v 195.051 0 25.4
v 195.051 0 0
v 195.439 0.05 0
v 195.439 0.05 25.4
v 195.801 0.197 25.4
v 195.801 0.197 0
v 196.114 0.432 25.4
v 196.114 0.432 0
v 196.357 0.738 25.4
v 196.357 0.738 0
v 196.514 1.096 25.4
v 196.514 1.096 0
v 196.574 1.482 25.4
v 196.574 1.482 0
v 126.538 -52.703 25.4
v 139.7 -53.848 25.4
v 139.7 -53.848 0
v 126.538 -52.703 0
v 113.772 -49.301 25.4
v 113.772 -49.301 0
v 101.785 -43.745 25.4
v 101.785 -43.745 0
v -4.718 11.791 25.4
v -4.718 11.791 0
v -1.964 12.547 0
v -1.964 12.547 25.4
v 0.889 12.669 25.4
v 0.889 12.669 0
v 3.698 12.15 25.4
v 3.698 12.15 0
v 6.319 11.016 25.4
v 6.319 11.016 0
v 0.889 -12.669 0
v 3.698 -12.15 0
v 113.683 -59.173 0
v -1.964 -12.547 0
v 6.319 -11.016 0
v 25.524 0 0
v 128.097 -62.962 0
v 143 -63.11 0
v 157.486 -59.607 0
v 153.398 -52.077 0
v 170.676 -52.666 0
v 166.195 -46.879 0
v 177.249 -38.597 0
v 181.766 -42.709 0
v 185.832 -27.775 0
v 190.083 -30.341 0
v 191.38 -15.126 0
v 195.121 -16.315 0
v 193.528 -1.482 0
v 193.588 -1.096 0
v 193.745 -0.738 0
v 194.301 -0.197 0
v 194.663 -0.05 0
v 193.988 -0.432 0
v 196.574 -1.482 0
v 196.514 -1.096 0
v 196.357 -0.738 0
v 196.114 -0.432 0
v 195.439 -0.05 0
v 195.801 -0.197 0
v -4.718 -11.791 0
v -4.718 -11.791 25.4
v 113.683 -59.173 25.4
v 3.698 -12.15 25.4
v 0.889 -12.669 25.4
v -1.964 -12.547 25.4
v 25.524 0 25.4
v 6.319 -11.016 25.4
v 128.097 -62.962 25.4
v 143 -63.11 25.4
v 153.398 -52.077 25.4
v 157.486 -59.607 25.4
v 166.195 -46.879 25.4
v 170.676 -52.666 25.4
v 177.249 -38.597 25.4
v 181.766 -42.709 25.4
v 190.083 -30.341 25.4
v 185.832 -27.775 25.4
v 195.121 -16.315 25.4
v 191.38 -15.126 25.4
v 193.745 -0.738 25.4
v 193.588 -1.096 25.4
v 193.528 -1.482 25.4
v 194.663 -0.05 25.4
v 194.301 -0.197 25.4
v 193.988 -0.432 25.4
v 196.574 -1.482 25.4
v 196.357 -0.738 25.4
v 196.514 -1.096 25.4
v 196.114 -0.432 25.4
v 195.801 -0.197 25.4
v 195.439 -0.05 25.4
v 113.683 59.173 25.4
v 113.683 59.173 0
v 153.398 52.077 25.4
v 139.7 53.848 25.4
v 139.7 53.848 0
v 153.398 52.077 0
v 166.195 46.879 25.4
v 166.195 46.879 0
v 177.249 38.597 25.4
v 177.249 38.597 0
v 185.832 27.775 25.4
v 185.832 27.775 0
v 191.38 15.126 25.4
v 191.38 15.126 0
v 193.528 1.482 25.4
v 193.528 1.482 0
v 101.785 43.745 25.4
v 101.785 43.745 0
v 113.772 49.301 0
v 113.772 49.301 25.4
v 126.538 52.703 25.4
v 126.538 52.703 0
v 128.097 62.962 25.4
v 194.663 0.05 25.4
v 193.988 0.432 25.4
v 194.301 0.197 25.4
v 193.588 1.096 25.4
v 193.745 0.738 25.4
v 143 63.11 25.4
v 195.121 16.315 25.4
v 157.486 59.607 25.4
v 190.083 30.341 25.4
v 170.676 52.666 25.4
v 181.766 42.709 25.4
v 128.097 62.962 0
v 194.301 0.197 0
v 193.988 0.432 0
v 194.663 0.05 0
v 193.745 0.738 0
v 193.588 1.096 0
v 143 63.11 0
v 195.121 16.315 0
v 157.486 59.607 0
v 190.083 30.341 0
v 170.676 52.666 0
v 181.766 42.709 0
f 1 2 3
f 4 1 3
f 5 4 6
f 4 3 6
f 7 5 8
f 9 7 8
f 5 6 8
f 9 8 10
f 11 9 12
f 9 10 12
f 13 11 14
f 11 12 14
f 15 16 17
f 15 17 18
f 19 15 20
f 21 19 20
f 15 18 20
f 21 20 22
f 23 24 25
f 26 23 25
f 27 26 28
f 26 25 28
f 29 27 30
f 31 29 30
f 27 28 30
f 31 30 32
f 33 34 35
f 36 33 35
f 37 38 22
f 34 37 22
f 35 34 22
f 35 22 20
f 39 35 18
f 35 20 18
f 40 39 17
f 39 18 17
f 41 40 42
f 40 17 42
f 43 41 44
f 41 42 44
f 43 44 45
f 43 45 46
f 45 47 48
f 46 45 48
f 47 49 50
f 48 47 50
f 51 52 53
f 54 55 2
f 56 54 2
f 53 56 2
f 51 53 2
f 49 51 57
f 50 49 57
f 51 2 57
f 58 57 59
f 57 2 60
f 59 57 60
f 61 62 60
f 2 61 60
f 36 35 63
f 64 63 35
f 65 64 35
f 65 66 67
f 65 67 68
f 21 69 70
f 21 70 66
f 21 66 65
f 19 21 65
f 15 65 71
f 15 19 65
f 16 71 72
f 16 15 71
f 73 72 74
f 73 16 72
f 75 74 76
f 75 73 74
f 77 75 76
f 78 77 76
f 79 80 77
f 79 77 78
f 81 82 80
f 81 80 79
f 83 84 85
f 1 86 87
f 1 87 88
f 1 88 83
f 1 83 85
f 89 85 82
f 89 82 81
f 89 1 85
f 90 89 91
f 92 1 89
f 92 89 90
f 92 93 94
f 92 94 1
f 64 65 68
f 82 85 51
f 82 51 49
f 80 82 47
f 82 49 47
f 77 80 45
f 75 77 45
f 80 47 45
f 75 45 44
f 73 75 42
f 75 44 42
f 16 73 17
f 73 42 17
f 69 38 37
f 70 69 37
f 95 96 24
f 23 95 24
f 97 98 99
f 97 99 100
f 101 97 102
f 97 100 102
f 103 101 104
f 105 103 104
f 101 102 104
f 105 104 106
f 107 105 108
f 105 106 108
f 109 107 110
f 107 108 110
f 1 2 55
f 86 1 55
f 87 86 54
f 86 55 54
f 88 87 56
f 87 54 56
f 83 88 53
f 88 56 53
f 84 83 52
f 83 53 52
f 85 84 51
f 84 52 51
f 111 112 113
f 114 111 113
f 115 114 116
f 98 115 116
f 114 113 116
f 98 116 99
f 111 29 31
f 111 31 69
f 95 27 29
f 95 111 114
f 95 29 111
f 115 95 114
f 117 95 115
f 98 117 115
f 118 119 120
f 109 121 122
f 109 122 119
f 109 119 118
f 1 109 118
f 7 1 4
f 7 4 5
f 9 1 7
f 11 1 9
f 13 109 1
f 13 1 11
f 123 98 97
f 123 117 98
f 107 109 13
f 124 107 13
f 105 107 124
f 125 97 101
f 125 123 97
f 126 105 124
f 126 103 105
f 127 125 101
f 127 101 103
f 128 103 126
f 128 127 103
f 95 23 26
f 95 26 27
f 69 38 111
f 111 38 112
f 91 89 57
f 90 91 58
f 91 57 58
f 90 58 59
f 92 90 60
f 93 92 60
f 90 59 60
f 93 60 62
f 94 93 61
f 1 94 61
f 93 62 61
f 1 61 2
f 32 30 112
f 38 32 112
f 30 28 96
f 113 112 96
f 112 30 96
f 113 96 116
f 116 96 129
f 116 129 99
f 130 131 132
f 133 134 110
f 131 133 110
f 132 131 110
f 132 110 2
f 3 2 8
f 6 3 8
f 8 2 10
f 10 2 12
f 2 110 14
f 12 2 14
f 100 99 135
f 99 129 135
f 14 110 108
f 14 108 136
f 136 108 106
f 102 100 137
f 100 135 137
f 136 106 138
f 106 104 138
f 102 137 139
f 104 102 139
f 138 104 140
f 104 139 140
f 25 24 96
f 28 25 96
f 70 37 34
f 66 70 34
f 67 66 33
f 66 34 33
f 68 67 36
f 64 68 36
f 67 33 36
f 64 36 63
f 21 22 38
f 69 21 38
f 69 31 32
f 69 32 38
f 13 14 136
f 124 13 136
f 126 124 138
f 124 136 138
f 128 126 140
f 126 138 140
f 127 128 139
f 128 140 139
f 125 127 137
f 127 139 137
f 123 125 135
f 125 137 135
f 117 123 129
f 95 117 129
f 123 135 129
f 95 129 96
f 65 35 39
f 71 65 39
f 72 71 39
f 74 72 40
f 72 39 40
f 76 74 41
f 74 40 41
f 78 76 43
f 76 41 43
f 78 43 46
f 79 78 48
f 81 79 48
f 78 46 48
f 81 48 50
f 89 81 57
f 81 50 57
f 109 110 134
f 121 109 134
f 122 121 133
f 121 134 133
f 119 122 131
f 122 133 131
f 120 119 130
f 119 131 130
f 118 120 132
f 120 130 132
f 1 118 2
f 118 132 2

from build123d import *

# Parameters (mm, degrees)
F1_DEPTH = 25.4


with BuildPart() as f1:
    # F0 (on Top) → F1 (new body)
    with BuildSketch(Plane.XY):
        with BuildLine():
            ThreePointArc((-4.718497, 11.790919), (0.889164, 12.668835), (6.31922, 11.016236))
            Line((6.31922, 11.016236), (25.523718, 0))
            Line((25.523718, 0), (101.784677, 43.745415))
            ThreePointArc((101.784677, 43.745415), (120.080915, 51.27905), (139.7, 53.848))
            ThreePointArc((139.7, 53.848), (177.248644, 38.596715), (193.527601, 1.482055))
            ThreePointArc((193.527601, 1.482055), (193.988326, 0.43164), (195.051024, 0))
            ThreePointArc((195.051024, 0), (196.113721, 0.43164), (196.574446, 1.482055))
            ThreePointArc((196.574446, 1.482055), (170.675567, 52.665815), (113.682684, 59.172777))
            Line((113.682684, 59.172777), (-4.718497, 11.790919))
        make_face()
        with BuildLine():
            Line((25.523718, 0), (6.31922, -11.016236))
            ThreePointArc((6.31922, -11.016236), (0.889164, -12.668835), (-4.718497, -11.790919))
            Line((-4.718497, -11.790919), (113.682684, -59.172777))
            ThreePointArc((113.682684, -59.172777), (170.675567, -52.665815), (196.574446, -1.482055))
            ThreePointArc((196.574446, -1.482055), (196.113721, -0.43164), (195.051024, 0))
            ThreePointArc((195.051024, 0), (193.988326, -0.43164), (193.527601, -1.482055))
            ThreePointArc((193.527601, -1.482055), (177.248644, -38.596715), (139.7, -53.848))
            ThreePointArc((139.7, -53.848), (120.080915, -51.27905), (101.784677, -43.745415))
            Line((101.784677, -43.745415), (25.523718, 0))
        make_face()
    extrude(amount=F1_DEPTH)


solid = f1.part
